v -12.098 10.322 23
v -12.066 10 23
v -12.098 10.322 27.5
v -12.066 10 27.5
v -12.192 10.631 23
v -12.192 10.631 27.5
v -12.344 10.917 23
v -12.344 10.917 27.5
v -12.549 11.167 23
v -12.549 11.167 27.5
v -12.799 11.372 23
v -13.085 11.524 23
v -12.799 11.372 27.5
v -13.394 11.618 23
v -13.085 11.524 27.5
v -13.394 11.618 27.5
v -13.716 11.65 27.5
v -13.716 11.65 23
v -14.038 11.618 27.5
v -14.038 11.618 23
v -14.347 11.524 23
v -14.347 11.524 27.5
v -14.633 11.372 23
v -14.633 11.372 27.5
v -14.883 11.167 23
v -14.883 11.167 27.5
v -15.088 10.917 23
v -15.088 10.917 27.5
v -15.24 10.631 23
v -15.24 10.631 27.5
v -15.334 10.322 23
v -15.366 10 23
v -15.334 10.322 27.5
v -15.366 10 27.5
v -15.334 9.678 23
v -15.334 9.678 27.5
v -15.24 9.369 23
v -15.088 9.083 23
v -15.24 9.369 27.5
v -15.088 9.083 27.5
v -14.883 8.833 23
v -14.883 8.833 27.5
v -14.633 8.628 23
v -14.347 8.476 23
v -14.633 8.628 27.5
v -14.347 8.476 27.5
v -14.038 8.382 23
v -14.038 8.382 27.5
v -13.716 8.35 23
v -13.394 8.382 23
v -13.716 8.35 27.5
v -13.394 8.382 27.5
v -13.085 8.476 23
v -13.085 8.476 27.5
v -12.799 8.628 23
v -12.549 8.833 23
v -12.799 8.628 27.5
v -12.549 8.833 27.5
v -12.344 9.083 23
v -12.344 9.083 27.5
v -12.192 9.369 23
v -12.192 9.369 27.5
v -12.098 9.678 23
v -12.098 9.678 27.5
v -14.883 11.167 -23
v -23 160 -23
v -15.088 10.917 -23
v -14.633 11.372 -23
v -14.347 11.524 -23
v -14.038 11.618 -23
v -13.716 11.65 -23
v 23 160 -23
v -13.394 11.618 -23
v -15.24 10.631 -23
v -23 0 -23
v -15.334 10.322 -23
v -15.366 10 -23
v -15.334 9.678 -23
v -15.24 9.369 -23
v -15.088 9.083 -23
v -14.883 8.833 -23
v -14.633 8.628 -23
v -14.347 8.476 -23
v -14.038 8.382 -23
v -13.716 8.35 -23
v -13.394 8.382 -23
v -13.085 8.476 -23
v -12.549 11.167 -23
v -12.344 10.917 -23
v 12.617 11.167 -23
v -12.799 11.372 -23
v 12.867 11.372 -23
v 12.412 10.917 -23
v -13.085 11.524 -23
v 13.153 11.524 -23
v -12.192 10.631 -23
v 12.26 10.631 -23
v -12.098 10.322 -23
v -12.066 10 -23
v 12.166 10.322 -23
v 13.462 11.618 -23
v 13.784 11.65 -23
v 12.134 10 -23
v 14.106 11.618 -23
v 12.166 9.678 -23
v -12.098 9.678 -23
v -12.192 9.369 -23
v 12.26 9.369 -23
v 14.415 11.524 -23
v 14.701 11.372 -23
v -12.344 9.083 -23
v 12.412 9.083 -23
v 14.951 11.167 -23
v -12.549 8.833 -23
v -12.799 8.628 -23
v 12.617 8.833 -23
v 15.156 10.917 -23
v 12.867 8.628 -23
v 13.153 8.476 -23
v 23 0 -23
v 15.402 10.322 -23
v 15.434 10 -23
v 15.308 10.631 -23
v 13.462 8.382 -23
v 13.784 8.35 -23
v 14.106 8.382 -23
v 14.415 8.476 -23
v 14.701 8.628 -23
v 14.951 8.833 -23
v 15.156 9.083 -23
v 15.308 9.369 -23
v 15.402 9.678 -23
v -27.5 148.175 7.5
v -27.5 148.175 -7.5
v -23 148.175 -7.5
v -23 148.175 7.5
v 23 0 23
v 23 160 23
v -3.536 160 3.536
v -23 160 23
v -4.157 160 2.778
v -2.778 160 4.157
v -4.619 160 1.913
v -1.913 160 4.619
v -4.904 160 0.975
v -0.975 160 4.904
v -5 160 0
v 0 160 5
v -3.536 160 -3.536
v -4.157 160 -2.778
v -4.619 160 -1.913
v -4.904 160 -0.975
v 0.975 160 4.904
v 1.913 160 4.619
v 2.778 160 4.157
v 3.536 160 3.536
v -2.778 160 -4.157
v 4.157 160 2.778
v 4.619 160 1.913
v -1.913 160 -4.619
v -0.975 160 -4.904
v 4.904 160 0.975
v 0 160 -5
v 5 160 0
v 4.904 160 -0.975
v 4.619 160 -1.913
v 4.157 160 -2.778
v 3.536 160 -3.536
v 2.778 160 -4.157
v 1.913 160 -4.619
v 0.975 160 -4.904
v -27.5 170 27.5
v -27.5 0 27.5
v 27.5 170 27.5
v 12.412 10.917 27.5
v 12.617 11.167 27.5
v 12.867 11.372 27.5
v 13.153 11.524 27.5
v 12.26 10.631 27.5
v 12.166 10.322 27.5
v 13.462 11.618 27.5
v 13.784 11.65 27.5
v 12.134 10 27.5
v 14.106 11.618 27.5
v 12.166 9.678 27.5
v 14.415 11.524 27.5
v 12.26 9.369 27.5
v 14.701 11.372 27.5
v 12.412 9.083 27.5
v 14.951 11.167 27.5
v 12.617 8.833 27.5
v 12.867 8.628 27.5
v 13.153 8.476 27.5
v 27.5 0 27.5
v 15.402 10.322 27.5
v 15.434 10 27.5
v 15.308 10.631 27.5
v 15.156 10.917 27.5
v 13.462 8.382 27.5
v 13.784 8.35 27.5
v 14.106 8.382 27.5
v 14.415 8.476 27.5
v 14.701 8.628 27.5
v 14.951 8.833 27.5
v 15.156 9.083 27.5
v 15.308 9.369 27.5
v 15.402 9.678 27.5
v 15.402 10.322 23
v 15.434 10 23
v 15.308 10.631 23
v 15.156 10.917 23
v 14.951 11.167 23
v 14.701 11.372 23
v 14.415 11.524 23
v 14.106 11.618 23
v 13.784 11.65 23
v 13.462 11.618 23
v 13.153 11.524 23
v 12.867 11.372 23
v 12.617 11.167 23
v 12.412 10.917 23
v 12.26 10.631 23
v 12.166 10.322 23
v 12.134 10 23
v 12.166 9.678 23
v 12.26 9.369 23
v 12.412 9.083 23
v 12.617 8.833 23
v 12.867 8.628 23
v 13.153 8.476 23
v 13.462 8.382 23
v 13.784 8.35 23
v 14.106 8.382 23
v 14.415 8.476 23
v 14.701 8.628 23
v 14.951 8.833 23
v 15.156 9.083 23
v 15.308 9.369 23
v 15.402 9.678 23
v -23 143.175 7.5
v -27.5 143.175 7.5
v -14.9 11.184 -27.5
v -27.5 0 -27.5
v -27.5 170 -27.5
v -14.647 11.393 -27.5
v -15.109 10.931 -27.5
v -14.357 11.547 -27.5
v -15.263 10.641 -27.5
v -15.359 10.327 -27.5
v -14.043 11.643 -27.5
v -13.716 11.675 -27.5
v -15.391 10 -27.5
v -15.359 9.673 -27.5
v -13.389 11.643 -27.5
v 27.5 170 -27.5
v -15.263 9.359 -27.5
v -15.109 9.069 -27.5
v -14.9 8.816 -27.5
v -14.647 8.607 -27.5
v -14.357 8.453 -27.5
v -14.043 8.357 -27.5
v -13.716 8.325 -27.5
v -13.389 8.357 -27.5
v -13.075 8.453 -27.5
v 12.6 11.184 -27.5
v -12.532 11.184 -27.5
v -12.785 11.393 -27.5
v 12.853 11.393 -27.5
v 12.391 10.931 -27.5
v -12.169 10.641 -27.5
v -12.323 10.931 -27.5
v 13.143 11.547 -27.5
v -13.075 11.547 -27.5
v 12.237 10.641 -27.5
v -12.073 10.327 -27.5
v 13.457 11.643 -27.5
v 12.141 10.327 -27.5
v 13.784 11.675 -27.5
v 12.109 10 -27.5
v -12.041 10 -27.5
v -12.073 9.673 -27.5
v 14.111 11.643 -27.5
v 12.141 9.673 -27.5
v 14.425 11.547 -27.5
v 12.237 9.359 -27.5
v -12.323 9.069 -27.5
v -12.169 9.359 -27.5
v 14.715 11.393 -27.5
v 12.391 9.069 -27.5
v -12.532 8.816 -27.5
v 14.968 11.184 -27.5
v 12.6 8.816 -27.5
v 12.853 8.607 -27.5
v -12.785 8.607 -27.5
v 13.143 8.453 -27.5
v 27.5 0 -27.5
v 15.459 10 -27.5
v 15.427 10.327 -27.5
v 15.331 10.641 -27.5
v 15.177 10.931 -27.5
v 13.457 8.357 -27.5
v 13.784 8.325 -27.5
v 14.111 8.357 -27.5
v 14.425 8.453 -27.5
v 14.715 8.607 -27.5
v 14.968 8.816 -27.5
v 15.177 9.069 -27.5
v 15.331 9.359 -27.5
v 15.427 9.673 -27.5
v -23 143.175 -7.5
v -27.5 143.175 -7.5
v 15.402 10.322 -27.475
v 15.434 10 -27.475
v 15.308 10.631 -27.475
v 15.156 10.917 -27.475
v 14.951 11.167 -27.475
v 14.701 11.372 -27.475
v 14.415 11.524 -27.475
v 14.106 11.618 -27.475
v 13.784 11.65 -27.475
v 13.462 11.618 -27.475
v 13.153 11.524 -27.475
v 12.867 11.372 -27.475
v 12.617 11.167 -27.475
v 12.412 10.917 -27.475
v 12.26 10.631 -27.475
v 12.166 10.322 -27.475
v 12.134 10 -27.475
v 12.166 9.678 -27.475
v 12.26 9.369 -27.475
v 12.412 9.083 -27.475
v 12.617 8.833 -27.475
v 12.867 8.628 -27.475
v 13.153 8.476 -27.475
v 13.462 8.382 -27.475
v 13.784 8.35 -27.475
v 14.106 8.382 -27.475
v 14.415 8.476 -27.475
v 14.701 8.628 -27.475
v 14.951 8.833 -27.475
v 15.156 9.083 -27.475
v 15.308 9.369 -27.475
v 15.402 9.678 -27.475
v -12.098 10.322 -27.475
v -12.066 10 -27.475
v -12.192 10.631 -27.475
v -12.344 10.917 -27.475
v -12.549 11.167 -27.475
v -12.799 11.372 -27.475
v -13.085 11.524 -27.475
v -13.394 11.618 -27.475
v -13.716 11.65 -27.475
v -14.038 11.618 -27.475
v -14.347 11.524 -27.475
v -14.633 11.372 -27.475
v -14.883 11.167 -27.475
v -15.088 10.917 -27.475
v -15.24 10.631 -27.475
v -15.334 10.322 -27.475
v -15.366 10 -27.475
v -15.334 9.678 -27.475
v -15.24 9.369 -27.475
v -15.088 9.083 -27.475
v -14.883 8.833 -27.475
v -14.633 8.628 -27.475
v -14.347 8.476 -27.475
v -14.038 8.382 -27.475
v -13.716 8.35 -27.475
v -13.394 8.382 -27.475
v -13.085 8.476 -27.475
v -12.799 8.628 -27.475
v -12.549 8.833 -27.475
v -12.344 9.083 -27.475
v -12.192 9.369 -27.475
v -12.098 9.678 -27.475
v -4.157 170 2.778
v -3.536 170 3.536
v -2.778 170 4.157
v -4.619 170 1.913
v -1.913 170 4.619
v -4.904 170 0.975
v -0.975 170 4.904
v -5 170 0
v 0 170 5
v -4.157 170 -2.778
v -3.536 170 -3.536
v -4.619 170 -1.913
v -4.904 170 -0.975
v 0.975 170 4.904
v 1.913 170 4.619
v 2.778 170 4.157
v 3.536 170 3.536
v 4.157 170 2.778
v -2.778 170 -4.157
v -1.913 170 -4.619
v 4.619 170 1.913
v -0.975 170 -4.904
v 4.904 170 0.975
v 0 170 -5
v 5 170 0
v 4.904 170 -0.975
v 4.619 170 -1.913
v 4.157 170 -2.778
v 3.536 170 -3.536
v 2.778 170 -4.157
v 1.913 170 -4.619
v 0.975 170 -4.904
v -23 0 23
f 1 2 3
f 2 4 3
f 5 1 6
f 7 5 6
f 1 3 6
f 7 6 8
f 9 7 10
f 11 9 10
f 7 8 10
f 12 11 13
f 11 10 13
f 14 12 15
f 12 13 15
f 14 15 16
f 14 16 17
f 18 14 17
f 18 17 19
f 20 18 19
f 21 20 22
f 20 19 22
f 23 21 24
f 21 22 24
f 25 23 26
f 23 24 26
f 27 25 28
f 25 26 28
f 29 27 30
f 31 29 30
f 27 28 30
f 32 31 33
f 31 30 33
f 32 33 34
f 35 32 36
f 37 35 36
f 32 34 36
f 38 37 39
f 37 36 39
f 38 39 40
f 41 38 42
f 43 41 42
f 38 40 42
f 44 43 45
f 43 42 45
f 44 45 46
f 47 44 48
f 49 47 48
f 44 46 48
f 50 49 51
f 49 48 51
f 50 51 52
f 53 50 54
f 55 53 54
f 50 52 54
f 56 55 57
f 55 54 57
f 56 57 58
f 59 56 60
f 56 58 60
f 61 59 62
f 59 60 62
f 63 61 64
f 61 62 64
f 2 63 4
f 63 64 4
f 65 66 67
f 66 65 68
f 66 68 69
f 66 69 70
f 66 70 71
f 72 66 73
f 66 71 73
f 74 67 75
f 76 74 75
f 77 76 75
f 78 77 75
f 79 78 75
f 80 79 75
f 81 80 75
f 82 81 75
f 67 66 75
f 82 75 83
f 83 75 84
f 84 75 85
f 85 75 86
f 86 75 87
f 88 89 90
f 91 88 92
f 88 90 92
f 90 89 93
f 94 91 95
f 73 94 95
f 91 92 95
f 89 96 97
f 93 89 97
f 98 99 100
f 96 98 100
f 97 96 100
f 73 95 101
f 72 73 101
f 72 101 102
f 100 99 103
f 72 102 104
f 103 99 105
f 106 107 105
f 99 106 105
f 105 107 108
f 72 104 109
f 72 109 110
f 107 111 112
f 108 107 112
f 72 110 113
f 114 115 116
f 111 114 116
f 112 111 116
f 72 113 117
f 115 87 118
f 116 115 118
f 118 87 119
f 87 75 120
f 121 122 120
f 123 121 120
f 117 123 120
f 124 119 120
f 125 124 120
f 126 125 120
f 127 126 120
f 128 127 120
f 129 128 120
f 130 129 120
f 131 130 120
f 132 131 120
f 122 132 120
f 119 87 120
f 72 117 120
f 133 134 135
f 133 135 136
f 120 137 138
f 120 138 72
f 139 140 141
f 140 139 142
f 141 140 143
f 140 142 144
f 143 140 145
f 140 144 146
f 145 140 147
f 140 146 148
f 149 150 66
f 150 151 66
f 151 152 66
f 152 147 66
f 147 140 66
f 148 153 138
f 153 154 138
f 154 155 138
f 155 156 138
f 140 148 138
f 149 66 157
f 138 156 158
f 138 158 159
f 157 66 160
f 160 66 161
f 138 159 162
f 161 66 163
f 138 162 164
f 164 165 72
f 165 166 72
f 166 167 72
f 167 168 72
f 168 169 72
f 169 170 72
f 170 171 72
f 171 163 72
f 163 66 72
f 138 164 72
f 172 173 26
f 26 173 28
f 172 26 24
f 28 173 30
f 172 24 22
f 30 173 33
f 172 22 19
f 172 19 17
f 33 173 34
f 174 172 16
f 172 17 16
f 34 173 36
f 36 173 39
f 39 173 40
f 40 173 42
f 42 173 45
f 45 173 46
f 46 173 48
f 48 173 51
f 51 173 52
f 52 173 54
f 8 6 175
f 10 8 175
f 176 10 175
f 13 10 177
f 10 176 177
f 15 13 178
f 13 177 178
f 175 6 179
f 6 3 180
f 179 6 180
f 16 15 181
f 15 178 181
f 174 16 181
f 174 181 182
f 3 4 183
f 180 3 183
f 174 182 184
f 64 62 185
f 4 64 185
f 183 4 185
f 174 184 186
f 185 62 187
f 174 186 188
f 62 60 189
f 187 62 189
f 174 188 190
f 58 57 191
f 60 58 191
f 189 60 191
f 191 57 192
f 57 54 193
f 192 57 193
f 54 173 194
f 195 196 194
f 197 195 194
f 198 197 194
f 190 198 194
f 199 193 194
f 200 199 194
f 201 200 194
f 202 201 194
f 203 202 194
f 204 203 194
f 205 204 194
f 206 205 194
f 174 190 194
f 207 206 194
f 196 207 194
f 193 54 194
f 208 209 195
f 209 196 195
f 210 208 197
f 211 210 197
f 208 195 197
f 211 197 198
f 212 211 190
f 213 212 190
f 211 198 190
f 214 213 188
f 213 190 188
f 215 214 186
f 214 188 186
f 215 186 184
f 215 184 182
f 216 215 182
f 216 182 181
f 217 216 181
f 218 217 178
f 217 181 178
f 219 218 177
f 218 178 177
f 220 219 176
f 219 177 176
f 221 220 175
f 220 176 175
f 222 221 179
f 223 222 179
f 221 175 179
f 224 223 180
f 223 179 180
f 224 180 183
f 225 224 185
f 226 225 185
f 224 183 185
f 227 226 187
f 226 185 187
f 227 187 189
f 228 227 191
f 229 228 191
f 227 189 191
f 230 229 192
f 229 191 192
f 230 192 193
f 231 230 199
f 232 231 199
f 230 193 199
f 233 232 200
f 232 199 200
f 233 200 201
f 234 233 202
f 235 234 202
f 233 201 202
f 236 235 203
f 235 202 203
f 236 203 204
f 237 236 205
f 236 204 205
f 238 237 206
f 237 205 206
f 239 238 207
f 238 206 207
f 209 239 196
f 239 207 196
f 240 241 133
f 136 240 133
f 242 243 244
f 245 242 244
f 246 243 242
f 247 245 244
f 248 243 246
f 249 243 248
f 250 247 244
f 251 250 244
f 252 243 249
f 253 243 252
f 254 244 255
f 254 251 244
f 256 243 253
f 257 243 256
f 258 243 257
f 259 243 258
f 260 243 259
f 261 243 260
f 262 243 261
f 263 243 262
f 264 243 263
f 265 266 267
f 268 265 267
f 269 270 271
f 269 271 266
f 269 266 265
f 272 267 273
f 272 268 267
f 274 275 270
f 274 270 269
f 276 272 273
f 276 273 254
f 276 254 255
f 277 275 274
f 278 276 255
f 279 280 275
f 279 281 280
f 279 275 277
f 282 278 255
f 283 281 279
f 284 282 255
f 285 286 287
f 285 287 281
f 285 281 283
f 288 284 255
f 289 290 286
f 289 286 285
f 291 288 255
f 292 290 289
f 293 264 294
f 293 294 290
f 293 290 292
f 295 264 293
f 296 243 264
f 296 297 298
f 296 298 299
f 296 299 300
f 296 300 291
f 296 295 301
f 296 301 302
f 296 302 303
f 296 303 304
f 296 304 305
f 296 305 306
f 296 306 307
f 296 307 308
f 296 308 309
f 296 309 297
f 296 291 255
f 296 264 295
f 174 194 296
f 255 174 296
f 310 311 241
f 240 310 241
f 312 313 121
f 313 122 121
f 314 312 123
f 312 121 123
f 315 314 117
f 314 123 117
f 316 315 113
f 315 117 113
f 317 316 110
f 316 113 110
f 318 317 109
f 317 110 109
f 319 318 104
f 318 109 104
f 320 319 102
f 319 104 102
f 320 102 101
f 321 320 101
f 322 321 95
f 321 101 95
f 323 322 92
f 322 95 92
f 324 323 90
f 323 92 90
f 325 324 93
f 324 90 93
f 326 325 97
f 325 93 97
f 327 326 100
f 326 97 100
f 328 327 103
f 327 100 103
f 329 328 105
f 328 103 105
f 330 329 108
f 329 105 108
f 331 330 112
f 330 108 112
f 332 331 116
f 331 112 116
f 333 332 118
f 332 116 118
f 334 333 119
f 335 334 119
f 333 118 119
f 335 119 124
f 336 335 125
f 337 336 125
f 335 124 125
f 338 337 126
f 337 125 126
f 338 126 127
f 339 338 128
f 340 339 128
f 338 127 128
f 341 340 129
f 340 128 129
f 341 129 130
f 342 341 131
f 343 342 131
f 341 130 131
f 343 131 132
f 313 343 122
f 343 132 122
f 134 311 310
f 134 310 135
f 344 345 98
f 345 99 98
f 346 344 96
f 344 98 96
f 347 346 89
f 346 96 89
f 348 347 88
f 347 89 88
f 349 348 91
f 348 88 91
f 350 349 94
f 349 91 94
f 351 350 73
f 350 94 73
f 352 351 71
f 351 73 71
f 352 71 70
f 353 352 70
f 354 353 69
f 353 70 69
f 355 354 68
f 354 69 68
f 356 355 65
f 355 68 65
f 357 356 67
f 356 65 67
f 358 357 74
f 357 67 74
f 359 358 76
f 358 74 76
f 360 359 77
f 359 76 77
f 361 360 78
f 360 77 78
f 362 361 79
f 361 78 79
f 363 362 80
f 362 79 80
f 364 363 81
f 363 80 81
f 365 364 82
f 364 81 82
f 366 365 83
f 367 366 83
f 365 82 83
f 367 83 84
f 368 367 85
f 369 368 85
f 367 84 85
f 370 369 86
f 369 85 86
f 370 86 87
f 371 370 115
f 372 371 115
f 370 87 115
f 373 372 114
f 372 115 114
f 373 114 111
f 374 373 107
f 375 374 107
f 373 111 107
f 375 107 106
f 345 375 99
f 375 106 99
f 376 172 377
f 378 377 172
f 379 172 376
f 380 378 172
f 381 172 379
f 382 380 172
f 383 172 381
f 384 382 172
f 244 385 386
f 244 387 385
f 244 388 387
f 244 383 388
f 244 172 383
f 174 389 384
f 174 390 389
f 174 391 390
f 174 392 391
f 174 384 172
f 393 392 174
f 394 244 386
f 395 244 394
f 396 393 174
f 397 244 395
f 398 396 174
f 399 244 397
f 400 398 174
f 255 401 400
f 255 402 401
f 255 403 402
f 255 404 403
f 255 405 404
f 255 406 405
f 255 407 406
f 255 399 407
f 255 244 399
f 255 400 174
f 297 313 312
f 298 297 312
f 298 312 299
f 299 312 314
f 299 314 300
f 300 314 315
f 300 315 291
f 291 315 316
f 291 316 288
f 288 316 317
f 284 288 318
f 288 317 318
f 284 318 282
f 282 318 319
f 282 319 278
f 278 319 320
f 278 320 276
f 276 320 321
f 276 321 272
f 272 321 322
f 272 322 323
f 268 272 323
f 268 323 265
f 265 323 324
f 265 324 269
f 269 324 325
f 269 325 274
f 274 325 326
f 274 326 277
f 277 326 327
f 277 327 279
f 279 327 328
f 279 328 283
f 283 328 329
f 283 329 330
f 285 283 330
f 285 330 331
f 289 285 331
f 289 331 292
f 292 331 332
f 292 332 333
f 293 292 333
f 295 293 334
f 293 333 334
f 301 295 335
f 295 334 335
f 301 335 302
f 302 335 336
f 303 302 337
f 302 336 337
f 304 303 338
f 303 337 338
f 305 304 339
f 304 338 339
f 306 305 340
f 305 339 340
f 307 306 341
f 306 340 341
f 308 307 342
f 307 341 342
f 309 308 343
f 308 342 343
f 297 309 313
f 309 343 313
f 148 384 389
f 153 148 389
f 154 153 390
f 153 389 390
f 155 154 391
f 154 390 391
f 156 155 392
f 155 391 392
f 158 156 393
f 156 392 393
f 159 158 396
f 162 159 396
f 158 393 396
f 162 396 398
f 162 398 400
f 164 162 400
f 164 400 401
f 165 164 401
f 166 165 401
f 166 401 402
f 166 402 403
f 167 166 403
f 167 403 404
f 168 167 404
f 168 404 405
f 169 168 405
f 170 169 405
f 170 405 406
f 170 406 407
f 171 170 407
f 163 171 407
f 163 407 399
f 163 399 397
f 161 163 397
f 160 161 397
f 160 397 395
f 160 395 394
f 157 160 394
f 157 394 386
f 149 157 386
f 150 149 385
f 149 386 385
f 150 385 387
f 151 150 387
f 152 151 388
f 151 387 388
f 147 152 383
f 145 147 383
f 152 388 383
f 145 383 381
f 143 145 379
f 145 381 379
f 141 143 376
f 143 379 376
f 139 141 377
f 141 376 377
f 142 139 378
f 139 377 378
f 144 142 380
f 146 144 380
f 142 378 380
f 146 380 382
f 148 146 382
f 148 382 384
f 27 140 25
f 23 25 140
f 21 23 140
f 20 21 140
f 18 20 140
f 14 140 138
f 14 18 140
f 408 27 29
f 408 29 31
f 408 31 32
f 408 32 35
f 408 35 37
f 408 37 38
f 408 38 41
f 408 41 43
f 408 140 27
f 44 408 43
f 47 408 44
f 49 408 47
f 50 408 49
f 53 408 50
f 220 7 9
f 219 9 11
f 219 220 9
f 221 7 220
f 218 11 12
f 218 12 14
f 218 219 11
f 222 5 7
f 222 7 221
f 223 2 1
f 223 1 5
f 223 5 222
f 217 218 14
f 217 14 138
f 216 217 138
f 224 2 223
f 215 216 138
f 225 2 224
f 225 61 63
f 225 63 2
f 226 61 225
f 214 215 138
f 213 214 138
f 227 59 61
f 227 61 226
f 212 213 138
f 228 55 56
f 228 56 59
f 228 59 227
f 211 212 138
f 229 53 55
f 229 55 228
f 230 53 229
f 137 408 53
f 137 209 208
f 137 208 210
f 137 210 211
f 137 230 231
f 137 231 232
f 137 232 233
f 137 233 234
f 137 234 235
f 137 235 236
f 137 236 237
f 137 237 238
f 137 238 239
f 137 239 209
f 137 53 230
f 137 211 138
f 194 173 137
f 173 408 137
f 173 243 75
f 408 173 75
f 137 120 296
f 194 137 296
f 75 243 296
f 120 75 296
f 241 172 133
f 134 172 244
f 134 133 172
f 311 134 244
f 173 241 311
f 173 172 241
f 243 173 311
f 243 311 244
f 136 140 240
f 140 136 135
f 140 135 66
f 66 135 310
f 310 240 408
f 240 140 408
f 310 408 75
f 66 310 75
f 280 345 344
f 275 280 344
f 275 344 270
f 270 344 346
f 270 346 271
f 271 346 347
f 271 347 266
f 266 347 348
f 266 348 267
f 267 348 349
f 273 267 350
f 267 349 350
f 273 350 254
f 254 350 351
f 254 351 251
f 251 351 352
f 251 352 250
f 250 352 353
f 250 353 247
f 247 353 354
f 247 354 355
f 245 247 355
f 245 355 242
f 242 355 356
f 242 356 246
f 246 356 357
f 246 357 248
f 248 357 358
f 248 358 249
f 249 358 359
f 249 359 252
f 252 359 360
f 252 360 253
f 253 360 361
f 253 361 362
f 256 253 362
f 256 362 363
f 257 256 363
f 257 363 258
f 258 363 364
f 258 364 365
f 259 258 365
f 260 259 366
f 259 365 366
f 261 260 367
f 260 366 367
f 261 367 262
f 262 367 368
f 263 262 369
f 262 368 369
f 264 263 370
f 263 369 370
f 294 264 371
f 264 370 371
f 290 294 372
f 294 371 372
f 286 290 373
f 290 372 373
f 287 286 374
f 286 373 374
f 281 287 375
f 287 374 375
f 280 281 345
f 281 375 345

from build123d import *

# Parameters (mm, degrees)
SKETCH1_W                         = 55
SKETCH1_H                         = 55
BOSS_EXTRUDE1_DEPTH               = 170
SKETCH2_W                         = 46
SKETCH2_H                         = 46
CUT_EXTRUDE4_DEPTH                = 160
SKETCH5_W                         = 14.999999972
SKETCH5_H                         = 5
CUT_EXTRUDE5_DEPTH                = 4.5
TAP_DRILL_FOR_M4_TAP1_D           = 3.3
TAP_DRILL_FOR_M4_TAP1_CSINK_D     = 3.35
TAP_DRILL_FOR_M4_TAP1_CSINK_ANGLE = 90
SKETCH8_R                         = 5
CUT_EXTRUDE6_DEPTH                = 175.391800266


with BuildPart() as part:
    # Sketch1 → Boss-Extrude1 (new body)
    with BuildSketch(Plane(origin=(0, 0, 0), x_dir=(1, 0, 0), z_dir=(0, 1, 0))):
        Rectangle(SKETCH1_W, SKETCH1_H)
    extrude(amount=BOSS_EXTRUDE1_DEPTH)

    # Sketch2 → Cut-Extrude4 (cut)
    with BuildSketch(Plane(origin=(0, 0, 0), x_dir=(1, 0, 0), z_dir=(0, 1, 0))):
        Rectangle(SKETCH2_W, SKETCH2_H)
    extrude(amount=CUT_EXTRUDE4_DEPTH, mode=Mode.SUBTRACT)

    # Sketch5 → Cut-Extrude5 (cut)
    with BuildSketch(Plane.ZY.offset(27.5)):
        with Locations((1.4e-08, 145.67539027)):
            Rectangle(SKETCH5_W, SKETCH5_H)
    extrude(amount=-CUT_EXTRUDE5_DEPTH, mode=Mode.SUBTRACT)

    # Tap Drill for M4 Tap1 (through all)
    with Locations(Plane(origin=(13.784, 10.000000066, -27.5), x_dir=(-1, 0, 0), z_dir=(0, 0, -1))):
        with Locations((0, 0), (27.5, 0)):
            CounterSinkHole(TAP_DRILL_FOR_M4_TAP1_D / 2, TAP_DRILL_FOR_M4_TAP1_CSINK_D / 2, counter_sink_angle=TAP_DRILL_FOR_M4_TAP1_CSINK_ANGLE)

    # Sketch8 → Cut-Extrude6 (cut, through all)
    with BuildSketch(Plane(origin=(0, 170, 0), x_dir=(1, 0, 0), z_dir=(0, 1, 0))):
        with Locations(Location((0, 0, 0), (0, 0, 270))):
            Circle(SKETCH8_R)
    extrude(amount=-CUT_EXTRUDE6_DEPTH, mode=Mode.SUBTRACT)


solid = part.part
